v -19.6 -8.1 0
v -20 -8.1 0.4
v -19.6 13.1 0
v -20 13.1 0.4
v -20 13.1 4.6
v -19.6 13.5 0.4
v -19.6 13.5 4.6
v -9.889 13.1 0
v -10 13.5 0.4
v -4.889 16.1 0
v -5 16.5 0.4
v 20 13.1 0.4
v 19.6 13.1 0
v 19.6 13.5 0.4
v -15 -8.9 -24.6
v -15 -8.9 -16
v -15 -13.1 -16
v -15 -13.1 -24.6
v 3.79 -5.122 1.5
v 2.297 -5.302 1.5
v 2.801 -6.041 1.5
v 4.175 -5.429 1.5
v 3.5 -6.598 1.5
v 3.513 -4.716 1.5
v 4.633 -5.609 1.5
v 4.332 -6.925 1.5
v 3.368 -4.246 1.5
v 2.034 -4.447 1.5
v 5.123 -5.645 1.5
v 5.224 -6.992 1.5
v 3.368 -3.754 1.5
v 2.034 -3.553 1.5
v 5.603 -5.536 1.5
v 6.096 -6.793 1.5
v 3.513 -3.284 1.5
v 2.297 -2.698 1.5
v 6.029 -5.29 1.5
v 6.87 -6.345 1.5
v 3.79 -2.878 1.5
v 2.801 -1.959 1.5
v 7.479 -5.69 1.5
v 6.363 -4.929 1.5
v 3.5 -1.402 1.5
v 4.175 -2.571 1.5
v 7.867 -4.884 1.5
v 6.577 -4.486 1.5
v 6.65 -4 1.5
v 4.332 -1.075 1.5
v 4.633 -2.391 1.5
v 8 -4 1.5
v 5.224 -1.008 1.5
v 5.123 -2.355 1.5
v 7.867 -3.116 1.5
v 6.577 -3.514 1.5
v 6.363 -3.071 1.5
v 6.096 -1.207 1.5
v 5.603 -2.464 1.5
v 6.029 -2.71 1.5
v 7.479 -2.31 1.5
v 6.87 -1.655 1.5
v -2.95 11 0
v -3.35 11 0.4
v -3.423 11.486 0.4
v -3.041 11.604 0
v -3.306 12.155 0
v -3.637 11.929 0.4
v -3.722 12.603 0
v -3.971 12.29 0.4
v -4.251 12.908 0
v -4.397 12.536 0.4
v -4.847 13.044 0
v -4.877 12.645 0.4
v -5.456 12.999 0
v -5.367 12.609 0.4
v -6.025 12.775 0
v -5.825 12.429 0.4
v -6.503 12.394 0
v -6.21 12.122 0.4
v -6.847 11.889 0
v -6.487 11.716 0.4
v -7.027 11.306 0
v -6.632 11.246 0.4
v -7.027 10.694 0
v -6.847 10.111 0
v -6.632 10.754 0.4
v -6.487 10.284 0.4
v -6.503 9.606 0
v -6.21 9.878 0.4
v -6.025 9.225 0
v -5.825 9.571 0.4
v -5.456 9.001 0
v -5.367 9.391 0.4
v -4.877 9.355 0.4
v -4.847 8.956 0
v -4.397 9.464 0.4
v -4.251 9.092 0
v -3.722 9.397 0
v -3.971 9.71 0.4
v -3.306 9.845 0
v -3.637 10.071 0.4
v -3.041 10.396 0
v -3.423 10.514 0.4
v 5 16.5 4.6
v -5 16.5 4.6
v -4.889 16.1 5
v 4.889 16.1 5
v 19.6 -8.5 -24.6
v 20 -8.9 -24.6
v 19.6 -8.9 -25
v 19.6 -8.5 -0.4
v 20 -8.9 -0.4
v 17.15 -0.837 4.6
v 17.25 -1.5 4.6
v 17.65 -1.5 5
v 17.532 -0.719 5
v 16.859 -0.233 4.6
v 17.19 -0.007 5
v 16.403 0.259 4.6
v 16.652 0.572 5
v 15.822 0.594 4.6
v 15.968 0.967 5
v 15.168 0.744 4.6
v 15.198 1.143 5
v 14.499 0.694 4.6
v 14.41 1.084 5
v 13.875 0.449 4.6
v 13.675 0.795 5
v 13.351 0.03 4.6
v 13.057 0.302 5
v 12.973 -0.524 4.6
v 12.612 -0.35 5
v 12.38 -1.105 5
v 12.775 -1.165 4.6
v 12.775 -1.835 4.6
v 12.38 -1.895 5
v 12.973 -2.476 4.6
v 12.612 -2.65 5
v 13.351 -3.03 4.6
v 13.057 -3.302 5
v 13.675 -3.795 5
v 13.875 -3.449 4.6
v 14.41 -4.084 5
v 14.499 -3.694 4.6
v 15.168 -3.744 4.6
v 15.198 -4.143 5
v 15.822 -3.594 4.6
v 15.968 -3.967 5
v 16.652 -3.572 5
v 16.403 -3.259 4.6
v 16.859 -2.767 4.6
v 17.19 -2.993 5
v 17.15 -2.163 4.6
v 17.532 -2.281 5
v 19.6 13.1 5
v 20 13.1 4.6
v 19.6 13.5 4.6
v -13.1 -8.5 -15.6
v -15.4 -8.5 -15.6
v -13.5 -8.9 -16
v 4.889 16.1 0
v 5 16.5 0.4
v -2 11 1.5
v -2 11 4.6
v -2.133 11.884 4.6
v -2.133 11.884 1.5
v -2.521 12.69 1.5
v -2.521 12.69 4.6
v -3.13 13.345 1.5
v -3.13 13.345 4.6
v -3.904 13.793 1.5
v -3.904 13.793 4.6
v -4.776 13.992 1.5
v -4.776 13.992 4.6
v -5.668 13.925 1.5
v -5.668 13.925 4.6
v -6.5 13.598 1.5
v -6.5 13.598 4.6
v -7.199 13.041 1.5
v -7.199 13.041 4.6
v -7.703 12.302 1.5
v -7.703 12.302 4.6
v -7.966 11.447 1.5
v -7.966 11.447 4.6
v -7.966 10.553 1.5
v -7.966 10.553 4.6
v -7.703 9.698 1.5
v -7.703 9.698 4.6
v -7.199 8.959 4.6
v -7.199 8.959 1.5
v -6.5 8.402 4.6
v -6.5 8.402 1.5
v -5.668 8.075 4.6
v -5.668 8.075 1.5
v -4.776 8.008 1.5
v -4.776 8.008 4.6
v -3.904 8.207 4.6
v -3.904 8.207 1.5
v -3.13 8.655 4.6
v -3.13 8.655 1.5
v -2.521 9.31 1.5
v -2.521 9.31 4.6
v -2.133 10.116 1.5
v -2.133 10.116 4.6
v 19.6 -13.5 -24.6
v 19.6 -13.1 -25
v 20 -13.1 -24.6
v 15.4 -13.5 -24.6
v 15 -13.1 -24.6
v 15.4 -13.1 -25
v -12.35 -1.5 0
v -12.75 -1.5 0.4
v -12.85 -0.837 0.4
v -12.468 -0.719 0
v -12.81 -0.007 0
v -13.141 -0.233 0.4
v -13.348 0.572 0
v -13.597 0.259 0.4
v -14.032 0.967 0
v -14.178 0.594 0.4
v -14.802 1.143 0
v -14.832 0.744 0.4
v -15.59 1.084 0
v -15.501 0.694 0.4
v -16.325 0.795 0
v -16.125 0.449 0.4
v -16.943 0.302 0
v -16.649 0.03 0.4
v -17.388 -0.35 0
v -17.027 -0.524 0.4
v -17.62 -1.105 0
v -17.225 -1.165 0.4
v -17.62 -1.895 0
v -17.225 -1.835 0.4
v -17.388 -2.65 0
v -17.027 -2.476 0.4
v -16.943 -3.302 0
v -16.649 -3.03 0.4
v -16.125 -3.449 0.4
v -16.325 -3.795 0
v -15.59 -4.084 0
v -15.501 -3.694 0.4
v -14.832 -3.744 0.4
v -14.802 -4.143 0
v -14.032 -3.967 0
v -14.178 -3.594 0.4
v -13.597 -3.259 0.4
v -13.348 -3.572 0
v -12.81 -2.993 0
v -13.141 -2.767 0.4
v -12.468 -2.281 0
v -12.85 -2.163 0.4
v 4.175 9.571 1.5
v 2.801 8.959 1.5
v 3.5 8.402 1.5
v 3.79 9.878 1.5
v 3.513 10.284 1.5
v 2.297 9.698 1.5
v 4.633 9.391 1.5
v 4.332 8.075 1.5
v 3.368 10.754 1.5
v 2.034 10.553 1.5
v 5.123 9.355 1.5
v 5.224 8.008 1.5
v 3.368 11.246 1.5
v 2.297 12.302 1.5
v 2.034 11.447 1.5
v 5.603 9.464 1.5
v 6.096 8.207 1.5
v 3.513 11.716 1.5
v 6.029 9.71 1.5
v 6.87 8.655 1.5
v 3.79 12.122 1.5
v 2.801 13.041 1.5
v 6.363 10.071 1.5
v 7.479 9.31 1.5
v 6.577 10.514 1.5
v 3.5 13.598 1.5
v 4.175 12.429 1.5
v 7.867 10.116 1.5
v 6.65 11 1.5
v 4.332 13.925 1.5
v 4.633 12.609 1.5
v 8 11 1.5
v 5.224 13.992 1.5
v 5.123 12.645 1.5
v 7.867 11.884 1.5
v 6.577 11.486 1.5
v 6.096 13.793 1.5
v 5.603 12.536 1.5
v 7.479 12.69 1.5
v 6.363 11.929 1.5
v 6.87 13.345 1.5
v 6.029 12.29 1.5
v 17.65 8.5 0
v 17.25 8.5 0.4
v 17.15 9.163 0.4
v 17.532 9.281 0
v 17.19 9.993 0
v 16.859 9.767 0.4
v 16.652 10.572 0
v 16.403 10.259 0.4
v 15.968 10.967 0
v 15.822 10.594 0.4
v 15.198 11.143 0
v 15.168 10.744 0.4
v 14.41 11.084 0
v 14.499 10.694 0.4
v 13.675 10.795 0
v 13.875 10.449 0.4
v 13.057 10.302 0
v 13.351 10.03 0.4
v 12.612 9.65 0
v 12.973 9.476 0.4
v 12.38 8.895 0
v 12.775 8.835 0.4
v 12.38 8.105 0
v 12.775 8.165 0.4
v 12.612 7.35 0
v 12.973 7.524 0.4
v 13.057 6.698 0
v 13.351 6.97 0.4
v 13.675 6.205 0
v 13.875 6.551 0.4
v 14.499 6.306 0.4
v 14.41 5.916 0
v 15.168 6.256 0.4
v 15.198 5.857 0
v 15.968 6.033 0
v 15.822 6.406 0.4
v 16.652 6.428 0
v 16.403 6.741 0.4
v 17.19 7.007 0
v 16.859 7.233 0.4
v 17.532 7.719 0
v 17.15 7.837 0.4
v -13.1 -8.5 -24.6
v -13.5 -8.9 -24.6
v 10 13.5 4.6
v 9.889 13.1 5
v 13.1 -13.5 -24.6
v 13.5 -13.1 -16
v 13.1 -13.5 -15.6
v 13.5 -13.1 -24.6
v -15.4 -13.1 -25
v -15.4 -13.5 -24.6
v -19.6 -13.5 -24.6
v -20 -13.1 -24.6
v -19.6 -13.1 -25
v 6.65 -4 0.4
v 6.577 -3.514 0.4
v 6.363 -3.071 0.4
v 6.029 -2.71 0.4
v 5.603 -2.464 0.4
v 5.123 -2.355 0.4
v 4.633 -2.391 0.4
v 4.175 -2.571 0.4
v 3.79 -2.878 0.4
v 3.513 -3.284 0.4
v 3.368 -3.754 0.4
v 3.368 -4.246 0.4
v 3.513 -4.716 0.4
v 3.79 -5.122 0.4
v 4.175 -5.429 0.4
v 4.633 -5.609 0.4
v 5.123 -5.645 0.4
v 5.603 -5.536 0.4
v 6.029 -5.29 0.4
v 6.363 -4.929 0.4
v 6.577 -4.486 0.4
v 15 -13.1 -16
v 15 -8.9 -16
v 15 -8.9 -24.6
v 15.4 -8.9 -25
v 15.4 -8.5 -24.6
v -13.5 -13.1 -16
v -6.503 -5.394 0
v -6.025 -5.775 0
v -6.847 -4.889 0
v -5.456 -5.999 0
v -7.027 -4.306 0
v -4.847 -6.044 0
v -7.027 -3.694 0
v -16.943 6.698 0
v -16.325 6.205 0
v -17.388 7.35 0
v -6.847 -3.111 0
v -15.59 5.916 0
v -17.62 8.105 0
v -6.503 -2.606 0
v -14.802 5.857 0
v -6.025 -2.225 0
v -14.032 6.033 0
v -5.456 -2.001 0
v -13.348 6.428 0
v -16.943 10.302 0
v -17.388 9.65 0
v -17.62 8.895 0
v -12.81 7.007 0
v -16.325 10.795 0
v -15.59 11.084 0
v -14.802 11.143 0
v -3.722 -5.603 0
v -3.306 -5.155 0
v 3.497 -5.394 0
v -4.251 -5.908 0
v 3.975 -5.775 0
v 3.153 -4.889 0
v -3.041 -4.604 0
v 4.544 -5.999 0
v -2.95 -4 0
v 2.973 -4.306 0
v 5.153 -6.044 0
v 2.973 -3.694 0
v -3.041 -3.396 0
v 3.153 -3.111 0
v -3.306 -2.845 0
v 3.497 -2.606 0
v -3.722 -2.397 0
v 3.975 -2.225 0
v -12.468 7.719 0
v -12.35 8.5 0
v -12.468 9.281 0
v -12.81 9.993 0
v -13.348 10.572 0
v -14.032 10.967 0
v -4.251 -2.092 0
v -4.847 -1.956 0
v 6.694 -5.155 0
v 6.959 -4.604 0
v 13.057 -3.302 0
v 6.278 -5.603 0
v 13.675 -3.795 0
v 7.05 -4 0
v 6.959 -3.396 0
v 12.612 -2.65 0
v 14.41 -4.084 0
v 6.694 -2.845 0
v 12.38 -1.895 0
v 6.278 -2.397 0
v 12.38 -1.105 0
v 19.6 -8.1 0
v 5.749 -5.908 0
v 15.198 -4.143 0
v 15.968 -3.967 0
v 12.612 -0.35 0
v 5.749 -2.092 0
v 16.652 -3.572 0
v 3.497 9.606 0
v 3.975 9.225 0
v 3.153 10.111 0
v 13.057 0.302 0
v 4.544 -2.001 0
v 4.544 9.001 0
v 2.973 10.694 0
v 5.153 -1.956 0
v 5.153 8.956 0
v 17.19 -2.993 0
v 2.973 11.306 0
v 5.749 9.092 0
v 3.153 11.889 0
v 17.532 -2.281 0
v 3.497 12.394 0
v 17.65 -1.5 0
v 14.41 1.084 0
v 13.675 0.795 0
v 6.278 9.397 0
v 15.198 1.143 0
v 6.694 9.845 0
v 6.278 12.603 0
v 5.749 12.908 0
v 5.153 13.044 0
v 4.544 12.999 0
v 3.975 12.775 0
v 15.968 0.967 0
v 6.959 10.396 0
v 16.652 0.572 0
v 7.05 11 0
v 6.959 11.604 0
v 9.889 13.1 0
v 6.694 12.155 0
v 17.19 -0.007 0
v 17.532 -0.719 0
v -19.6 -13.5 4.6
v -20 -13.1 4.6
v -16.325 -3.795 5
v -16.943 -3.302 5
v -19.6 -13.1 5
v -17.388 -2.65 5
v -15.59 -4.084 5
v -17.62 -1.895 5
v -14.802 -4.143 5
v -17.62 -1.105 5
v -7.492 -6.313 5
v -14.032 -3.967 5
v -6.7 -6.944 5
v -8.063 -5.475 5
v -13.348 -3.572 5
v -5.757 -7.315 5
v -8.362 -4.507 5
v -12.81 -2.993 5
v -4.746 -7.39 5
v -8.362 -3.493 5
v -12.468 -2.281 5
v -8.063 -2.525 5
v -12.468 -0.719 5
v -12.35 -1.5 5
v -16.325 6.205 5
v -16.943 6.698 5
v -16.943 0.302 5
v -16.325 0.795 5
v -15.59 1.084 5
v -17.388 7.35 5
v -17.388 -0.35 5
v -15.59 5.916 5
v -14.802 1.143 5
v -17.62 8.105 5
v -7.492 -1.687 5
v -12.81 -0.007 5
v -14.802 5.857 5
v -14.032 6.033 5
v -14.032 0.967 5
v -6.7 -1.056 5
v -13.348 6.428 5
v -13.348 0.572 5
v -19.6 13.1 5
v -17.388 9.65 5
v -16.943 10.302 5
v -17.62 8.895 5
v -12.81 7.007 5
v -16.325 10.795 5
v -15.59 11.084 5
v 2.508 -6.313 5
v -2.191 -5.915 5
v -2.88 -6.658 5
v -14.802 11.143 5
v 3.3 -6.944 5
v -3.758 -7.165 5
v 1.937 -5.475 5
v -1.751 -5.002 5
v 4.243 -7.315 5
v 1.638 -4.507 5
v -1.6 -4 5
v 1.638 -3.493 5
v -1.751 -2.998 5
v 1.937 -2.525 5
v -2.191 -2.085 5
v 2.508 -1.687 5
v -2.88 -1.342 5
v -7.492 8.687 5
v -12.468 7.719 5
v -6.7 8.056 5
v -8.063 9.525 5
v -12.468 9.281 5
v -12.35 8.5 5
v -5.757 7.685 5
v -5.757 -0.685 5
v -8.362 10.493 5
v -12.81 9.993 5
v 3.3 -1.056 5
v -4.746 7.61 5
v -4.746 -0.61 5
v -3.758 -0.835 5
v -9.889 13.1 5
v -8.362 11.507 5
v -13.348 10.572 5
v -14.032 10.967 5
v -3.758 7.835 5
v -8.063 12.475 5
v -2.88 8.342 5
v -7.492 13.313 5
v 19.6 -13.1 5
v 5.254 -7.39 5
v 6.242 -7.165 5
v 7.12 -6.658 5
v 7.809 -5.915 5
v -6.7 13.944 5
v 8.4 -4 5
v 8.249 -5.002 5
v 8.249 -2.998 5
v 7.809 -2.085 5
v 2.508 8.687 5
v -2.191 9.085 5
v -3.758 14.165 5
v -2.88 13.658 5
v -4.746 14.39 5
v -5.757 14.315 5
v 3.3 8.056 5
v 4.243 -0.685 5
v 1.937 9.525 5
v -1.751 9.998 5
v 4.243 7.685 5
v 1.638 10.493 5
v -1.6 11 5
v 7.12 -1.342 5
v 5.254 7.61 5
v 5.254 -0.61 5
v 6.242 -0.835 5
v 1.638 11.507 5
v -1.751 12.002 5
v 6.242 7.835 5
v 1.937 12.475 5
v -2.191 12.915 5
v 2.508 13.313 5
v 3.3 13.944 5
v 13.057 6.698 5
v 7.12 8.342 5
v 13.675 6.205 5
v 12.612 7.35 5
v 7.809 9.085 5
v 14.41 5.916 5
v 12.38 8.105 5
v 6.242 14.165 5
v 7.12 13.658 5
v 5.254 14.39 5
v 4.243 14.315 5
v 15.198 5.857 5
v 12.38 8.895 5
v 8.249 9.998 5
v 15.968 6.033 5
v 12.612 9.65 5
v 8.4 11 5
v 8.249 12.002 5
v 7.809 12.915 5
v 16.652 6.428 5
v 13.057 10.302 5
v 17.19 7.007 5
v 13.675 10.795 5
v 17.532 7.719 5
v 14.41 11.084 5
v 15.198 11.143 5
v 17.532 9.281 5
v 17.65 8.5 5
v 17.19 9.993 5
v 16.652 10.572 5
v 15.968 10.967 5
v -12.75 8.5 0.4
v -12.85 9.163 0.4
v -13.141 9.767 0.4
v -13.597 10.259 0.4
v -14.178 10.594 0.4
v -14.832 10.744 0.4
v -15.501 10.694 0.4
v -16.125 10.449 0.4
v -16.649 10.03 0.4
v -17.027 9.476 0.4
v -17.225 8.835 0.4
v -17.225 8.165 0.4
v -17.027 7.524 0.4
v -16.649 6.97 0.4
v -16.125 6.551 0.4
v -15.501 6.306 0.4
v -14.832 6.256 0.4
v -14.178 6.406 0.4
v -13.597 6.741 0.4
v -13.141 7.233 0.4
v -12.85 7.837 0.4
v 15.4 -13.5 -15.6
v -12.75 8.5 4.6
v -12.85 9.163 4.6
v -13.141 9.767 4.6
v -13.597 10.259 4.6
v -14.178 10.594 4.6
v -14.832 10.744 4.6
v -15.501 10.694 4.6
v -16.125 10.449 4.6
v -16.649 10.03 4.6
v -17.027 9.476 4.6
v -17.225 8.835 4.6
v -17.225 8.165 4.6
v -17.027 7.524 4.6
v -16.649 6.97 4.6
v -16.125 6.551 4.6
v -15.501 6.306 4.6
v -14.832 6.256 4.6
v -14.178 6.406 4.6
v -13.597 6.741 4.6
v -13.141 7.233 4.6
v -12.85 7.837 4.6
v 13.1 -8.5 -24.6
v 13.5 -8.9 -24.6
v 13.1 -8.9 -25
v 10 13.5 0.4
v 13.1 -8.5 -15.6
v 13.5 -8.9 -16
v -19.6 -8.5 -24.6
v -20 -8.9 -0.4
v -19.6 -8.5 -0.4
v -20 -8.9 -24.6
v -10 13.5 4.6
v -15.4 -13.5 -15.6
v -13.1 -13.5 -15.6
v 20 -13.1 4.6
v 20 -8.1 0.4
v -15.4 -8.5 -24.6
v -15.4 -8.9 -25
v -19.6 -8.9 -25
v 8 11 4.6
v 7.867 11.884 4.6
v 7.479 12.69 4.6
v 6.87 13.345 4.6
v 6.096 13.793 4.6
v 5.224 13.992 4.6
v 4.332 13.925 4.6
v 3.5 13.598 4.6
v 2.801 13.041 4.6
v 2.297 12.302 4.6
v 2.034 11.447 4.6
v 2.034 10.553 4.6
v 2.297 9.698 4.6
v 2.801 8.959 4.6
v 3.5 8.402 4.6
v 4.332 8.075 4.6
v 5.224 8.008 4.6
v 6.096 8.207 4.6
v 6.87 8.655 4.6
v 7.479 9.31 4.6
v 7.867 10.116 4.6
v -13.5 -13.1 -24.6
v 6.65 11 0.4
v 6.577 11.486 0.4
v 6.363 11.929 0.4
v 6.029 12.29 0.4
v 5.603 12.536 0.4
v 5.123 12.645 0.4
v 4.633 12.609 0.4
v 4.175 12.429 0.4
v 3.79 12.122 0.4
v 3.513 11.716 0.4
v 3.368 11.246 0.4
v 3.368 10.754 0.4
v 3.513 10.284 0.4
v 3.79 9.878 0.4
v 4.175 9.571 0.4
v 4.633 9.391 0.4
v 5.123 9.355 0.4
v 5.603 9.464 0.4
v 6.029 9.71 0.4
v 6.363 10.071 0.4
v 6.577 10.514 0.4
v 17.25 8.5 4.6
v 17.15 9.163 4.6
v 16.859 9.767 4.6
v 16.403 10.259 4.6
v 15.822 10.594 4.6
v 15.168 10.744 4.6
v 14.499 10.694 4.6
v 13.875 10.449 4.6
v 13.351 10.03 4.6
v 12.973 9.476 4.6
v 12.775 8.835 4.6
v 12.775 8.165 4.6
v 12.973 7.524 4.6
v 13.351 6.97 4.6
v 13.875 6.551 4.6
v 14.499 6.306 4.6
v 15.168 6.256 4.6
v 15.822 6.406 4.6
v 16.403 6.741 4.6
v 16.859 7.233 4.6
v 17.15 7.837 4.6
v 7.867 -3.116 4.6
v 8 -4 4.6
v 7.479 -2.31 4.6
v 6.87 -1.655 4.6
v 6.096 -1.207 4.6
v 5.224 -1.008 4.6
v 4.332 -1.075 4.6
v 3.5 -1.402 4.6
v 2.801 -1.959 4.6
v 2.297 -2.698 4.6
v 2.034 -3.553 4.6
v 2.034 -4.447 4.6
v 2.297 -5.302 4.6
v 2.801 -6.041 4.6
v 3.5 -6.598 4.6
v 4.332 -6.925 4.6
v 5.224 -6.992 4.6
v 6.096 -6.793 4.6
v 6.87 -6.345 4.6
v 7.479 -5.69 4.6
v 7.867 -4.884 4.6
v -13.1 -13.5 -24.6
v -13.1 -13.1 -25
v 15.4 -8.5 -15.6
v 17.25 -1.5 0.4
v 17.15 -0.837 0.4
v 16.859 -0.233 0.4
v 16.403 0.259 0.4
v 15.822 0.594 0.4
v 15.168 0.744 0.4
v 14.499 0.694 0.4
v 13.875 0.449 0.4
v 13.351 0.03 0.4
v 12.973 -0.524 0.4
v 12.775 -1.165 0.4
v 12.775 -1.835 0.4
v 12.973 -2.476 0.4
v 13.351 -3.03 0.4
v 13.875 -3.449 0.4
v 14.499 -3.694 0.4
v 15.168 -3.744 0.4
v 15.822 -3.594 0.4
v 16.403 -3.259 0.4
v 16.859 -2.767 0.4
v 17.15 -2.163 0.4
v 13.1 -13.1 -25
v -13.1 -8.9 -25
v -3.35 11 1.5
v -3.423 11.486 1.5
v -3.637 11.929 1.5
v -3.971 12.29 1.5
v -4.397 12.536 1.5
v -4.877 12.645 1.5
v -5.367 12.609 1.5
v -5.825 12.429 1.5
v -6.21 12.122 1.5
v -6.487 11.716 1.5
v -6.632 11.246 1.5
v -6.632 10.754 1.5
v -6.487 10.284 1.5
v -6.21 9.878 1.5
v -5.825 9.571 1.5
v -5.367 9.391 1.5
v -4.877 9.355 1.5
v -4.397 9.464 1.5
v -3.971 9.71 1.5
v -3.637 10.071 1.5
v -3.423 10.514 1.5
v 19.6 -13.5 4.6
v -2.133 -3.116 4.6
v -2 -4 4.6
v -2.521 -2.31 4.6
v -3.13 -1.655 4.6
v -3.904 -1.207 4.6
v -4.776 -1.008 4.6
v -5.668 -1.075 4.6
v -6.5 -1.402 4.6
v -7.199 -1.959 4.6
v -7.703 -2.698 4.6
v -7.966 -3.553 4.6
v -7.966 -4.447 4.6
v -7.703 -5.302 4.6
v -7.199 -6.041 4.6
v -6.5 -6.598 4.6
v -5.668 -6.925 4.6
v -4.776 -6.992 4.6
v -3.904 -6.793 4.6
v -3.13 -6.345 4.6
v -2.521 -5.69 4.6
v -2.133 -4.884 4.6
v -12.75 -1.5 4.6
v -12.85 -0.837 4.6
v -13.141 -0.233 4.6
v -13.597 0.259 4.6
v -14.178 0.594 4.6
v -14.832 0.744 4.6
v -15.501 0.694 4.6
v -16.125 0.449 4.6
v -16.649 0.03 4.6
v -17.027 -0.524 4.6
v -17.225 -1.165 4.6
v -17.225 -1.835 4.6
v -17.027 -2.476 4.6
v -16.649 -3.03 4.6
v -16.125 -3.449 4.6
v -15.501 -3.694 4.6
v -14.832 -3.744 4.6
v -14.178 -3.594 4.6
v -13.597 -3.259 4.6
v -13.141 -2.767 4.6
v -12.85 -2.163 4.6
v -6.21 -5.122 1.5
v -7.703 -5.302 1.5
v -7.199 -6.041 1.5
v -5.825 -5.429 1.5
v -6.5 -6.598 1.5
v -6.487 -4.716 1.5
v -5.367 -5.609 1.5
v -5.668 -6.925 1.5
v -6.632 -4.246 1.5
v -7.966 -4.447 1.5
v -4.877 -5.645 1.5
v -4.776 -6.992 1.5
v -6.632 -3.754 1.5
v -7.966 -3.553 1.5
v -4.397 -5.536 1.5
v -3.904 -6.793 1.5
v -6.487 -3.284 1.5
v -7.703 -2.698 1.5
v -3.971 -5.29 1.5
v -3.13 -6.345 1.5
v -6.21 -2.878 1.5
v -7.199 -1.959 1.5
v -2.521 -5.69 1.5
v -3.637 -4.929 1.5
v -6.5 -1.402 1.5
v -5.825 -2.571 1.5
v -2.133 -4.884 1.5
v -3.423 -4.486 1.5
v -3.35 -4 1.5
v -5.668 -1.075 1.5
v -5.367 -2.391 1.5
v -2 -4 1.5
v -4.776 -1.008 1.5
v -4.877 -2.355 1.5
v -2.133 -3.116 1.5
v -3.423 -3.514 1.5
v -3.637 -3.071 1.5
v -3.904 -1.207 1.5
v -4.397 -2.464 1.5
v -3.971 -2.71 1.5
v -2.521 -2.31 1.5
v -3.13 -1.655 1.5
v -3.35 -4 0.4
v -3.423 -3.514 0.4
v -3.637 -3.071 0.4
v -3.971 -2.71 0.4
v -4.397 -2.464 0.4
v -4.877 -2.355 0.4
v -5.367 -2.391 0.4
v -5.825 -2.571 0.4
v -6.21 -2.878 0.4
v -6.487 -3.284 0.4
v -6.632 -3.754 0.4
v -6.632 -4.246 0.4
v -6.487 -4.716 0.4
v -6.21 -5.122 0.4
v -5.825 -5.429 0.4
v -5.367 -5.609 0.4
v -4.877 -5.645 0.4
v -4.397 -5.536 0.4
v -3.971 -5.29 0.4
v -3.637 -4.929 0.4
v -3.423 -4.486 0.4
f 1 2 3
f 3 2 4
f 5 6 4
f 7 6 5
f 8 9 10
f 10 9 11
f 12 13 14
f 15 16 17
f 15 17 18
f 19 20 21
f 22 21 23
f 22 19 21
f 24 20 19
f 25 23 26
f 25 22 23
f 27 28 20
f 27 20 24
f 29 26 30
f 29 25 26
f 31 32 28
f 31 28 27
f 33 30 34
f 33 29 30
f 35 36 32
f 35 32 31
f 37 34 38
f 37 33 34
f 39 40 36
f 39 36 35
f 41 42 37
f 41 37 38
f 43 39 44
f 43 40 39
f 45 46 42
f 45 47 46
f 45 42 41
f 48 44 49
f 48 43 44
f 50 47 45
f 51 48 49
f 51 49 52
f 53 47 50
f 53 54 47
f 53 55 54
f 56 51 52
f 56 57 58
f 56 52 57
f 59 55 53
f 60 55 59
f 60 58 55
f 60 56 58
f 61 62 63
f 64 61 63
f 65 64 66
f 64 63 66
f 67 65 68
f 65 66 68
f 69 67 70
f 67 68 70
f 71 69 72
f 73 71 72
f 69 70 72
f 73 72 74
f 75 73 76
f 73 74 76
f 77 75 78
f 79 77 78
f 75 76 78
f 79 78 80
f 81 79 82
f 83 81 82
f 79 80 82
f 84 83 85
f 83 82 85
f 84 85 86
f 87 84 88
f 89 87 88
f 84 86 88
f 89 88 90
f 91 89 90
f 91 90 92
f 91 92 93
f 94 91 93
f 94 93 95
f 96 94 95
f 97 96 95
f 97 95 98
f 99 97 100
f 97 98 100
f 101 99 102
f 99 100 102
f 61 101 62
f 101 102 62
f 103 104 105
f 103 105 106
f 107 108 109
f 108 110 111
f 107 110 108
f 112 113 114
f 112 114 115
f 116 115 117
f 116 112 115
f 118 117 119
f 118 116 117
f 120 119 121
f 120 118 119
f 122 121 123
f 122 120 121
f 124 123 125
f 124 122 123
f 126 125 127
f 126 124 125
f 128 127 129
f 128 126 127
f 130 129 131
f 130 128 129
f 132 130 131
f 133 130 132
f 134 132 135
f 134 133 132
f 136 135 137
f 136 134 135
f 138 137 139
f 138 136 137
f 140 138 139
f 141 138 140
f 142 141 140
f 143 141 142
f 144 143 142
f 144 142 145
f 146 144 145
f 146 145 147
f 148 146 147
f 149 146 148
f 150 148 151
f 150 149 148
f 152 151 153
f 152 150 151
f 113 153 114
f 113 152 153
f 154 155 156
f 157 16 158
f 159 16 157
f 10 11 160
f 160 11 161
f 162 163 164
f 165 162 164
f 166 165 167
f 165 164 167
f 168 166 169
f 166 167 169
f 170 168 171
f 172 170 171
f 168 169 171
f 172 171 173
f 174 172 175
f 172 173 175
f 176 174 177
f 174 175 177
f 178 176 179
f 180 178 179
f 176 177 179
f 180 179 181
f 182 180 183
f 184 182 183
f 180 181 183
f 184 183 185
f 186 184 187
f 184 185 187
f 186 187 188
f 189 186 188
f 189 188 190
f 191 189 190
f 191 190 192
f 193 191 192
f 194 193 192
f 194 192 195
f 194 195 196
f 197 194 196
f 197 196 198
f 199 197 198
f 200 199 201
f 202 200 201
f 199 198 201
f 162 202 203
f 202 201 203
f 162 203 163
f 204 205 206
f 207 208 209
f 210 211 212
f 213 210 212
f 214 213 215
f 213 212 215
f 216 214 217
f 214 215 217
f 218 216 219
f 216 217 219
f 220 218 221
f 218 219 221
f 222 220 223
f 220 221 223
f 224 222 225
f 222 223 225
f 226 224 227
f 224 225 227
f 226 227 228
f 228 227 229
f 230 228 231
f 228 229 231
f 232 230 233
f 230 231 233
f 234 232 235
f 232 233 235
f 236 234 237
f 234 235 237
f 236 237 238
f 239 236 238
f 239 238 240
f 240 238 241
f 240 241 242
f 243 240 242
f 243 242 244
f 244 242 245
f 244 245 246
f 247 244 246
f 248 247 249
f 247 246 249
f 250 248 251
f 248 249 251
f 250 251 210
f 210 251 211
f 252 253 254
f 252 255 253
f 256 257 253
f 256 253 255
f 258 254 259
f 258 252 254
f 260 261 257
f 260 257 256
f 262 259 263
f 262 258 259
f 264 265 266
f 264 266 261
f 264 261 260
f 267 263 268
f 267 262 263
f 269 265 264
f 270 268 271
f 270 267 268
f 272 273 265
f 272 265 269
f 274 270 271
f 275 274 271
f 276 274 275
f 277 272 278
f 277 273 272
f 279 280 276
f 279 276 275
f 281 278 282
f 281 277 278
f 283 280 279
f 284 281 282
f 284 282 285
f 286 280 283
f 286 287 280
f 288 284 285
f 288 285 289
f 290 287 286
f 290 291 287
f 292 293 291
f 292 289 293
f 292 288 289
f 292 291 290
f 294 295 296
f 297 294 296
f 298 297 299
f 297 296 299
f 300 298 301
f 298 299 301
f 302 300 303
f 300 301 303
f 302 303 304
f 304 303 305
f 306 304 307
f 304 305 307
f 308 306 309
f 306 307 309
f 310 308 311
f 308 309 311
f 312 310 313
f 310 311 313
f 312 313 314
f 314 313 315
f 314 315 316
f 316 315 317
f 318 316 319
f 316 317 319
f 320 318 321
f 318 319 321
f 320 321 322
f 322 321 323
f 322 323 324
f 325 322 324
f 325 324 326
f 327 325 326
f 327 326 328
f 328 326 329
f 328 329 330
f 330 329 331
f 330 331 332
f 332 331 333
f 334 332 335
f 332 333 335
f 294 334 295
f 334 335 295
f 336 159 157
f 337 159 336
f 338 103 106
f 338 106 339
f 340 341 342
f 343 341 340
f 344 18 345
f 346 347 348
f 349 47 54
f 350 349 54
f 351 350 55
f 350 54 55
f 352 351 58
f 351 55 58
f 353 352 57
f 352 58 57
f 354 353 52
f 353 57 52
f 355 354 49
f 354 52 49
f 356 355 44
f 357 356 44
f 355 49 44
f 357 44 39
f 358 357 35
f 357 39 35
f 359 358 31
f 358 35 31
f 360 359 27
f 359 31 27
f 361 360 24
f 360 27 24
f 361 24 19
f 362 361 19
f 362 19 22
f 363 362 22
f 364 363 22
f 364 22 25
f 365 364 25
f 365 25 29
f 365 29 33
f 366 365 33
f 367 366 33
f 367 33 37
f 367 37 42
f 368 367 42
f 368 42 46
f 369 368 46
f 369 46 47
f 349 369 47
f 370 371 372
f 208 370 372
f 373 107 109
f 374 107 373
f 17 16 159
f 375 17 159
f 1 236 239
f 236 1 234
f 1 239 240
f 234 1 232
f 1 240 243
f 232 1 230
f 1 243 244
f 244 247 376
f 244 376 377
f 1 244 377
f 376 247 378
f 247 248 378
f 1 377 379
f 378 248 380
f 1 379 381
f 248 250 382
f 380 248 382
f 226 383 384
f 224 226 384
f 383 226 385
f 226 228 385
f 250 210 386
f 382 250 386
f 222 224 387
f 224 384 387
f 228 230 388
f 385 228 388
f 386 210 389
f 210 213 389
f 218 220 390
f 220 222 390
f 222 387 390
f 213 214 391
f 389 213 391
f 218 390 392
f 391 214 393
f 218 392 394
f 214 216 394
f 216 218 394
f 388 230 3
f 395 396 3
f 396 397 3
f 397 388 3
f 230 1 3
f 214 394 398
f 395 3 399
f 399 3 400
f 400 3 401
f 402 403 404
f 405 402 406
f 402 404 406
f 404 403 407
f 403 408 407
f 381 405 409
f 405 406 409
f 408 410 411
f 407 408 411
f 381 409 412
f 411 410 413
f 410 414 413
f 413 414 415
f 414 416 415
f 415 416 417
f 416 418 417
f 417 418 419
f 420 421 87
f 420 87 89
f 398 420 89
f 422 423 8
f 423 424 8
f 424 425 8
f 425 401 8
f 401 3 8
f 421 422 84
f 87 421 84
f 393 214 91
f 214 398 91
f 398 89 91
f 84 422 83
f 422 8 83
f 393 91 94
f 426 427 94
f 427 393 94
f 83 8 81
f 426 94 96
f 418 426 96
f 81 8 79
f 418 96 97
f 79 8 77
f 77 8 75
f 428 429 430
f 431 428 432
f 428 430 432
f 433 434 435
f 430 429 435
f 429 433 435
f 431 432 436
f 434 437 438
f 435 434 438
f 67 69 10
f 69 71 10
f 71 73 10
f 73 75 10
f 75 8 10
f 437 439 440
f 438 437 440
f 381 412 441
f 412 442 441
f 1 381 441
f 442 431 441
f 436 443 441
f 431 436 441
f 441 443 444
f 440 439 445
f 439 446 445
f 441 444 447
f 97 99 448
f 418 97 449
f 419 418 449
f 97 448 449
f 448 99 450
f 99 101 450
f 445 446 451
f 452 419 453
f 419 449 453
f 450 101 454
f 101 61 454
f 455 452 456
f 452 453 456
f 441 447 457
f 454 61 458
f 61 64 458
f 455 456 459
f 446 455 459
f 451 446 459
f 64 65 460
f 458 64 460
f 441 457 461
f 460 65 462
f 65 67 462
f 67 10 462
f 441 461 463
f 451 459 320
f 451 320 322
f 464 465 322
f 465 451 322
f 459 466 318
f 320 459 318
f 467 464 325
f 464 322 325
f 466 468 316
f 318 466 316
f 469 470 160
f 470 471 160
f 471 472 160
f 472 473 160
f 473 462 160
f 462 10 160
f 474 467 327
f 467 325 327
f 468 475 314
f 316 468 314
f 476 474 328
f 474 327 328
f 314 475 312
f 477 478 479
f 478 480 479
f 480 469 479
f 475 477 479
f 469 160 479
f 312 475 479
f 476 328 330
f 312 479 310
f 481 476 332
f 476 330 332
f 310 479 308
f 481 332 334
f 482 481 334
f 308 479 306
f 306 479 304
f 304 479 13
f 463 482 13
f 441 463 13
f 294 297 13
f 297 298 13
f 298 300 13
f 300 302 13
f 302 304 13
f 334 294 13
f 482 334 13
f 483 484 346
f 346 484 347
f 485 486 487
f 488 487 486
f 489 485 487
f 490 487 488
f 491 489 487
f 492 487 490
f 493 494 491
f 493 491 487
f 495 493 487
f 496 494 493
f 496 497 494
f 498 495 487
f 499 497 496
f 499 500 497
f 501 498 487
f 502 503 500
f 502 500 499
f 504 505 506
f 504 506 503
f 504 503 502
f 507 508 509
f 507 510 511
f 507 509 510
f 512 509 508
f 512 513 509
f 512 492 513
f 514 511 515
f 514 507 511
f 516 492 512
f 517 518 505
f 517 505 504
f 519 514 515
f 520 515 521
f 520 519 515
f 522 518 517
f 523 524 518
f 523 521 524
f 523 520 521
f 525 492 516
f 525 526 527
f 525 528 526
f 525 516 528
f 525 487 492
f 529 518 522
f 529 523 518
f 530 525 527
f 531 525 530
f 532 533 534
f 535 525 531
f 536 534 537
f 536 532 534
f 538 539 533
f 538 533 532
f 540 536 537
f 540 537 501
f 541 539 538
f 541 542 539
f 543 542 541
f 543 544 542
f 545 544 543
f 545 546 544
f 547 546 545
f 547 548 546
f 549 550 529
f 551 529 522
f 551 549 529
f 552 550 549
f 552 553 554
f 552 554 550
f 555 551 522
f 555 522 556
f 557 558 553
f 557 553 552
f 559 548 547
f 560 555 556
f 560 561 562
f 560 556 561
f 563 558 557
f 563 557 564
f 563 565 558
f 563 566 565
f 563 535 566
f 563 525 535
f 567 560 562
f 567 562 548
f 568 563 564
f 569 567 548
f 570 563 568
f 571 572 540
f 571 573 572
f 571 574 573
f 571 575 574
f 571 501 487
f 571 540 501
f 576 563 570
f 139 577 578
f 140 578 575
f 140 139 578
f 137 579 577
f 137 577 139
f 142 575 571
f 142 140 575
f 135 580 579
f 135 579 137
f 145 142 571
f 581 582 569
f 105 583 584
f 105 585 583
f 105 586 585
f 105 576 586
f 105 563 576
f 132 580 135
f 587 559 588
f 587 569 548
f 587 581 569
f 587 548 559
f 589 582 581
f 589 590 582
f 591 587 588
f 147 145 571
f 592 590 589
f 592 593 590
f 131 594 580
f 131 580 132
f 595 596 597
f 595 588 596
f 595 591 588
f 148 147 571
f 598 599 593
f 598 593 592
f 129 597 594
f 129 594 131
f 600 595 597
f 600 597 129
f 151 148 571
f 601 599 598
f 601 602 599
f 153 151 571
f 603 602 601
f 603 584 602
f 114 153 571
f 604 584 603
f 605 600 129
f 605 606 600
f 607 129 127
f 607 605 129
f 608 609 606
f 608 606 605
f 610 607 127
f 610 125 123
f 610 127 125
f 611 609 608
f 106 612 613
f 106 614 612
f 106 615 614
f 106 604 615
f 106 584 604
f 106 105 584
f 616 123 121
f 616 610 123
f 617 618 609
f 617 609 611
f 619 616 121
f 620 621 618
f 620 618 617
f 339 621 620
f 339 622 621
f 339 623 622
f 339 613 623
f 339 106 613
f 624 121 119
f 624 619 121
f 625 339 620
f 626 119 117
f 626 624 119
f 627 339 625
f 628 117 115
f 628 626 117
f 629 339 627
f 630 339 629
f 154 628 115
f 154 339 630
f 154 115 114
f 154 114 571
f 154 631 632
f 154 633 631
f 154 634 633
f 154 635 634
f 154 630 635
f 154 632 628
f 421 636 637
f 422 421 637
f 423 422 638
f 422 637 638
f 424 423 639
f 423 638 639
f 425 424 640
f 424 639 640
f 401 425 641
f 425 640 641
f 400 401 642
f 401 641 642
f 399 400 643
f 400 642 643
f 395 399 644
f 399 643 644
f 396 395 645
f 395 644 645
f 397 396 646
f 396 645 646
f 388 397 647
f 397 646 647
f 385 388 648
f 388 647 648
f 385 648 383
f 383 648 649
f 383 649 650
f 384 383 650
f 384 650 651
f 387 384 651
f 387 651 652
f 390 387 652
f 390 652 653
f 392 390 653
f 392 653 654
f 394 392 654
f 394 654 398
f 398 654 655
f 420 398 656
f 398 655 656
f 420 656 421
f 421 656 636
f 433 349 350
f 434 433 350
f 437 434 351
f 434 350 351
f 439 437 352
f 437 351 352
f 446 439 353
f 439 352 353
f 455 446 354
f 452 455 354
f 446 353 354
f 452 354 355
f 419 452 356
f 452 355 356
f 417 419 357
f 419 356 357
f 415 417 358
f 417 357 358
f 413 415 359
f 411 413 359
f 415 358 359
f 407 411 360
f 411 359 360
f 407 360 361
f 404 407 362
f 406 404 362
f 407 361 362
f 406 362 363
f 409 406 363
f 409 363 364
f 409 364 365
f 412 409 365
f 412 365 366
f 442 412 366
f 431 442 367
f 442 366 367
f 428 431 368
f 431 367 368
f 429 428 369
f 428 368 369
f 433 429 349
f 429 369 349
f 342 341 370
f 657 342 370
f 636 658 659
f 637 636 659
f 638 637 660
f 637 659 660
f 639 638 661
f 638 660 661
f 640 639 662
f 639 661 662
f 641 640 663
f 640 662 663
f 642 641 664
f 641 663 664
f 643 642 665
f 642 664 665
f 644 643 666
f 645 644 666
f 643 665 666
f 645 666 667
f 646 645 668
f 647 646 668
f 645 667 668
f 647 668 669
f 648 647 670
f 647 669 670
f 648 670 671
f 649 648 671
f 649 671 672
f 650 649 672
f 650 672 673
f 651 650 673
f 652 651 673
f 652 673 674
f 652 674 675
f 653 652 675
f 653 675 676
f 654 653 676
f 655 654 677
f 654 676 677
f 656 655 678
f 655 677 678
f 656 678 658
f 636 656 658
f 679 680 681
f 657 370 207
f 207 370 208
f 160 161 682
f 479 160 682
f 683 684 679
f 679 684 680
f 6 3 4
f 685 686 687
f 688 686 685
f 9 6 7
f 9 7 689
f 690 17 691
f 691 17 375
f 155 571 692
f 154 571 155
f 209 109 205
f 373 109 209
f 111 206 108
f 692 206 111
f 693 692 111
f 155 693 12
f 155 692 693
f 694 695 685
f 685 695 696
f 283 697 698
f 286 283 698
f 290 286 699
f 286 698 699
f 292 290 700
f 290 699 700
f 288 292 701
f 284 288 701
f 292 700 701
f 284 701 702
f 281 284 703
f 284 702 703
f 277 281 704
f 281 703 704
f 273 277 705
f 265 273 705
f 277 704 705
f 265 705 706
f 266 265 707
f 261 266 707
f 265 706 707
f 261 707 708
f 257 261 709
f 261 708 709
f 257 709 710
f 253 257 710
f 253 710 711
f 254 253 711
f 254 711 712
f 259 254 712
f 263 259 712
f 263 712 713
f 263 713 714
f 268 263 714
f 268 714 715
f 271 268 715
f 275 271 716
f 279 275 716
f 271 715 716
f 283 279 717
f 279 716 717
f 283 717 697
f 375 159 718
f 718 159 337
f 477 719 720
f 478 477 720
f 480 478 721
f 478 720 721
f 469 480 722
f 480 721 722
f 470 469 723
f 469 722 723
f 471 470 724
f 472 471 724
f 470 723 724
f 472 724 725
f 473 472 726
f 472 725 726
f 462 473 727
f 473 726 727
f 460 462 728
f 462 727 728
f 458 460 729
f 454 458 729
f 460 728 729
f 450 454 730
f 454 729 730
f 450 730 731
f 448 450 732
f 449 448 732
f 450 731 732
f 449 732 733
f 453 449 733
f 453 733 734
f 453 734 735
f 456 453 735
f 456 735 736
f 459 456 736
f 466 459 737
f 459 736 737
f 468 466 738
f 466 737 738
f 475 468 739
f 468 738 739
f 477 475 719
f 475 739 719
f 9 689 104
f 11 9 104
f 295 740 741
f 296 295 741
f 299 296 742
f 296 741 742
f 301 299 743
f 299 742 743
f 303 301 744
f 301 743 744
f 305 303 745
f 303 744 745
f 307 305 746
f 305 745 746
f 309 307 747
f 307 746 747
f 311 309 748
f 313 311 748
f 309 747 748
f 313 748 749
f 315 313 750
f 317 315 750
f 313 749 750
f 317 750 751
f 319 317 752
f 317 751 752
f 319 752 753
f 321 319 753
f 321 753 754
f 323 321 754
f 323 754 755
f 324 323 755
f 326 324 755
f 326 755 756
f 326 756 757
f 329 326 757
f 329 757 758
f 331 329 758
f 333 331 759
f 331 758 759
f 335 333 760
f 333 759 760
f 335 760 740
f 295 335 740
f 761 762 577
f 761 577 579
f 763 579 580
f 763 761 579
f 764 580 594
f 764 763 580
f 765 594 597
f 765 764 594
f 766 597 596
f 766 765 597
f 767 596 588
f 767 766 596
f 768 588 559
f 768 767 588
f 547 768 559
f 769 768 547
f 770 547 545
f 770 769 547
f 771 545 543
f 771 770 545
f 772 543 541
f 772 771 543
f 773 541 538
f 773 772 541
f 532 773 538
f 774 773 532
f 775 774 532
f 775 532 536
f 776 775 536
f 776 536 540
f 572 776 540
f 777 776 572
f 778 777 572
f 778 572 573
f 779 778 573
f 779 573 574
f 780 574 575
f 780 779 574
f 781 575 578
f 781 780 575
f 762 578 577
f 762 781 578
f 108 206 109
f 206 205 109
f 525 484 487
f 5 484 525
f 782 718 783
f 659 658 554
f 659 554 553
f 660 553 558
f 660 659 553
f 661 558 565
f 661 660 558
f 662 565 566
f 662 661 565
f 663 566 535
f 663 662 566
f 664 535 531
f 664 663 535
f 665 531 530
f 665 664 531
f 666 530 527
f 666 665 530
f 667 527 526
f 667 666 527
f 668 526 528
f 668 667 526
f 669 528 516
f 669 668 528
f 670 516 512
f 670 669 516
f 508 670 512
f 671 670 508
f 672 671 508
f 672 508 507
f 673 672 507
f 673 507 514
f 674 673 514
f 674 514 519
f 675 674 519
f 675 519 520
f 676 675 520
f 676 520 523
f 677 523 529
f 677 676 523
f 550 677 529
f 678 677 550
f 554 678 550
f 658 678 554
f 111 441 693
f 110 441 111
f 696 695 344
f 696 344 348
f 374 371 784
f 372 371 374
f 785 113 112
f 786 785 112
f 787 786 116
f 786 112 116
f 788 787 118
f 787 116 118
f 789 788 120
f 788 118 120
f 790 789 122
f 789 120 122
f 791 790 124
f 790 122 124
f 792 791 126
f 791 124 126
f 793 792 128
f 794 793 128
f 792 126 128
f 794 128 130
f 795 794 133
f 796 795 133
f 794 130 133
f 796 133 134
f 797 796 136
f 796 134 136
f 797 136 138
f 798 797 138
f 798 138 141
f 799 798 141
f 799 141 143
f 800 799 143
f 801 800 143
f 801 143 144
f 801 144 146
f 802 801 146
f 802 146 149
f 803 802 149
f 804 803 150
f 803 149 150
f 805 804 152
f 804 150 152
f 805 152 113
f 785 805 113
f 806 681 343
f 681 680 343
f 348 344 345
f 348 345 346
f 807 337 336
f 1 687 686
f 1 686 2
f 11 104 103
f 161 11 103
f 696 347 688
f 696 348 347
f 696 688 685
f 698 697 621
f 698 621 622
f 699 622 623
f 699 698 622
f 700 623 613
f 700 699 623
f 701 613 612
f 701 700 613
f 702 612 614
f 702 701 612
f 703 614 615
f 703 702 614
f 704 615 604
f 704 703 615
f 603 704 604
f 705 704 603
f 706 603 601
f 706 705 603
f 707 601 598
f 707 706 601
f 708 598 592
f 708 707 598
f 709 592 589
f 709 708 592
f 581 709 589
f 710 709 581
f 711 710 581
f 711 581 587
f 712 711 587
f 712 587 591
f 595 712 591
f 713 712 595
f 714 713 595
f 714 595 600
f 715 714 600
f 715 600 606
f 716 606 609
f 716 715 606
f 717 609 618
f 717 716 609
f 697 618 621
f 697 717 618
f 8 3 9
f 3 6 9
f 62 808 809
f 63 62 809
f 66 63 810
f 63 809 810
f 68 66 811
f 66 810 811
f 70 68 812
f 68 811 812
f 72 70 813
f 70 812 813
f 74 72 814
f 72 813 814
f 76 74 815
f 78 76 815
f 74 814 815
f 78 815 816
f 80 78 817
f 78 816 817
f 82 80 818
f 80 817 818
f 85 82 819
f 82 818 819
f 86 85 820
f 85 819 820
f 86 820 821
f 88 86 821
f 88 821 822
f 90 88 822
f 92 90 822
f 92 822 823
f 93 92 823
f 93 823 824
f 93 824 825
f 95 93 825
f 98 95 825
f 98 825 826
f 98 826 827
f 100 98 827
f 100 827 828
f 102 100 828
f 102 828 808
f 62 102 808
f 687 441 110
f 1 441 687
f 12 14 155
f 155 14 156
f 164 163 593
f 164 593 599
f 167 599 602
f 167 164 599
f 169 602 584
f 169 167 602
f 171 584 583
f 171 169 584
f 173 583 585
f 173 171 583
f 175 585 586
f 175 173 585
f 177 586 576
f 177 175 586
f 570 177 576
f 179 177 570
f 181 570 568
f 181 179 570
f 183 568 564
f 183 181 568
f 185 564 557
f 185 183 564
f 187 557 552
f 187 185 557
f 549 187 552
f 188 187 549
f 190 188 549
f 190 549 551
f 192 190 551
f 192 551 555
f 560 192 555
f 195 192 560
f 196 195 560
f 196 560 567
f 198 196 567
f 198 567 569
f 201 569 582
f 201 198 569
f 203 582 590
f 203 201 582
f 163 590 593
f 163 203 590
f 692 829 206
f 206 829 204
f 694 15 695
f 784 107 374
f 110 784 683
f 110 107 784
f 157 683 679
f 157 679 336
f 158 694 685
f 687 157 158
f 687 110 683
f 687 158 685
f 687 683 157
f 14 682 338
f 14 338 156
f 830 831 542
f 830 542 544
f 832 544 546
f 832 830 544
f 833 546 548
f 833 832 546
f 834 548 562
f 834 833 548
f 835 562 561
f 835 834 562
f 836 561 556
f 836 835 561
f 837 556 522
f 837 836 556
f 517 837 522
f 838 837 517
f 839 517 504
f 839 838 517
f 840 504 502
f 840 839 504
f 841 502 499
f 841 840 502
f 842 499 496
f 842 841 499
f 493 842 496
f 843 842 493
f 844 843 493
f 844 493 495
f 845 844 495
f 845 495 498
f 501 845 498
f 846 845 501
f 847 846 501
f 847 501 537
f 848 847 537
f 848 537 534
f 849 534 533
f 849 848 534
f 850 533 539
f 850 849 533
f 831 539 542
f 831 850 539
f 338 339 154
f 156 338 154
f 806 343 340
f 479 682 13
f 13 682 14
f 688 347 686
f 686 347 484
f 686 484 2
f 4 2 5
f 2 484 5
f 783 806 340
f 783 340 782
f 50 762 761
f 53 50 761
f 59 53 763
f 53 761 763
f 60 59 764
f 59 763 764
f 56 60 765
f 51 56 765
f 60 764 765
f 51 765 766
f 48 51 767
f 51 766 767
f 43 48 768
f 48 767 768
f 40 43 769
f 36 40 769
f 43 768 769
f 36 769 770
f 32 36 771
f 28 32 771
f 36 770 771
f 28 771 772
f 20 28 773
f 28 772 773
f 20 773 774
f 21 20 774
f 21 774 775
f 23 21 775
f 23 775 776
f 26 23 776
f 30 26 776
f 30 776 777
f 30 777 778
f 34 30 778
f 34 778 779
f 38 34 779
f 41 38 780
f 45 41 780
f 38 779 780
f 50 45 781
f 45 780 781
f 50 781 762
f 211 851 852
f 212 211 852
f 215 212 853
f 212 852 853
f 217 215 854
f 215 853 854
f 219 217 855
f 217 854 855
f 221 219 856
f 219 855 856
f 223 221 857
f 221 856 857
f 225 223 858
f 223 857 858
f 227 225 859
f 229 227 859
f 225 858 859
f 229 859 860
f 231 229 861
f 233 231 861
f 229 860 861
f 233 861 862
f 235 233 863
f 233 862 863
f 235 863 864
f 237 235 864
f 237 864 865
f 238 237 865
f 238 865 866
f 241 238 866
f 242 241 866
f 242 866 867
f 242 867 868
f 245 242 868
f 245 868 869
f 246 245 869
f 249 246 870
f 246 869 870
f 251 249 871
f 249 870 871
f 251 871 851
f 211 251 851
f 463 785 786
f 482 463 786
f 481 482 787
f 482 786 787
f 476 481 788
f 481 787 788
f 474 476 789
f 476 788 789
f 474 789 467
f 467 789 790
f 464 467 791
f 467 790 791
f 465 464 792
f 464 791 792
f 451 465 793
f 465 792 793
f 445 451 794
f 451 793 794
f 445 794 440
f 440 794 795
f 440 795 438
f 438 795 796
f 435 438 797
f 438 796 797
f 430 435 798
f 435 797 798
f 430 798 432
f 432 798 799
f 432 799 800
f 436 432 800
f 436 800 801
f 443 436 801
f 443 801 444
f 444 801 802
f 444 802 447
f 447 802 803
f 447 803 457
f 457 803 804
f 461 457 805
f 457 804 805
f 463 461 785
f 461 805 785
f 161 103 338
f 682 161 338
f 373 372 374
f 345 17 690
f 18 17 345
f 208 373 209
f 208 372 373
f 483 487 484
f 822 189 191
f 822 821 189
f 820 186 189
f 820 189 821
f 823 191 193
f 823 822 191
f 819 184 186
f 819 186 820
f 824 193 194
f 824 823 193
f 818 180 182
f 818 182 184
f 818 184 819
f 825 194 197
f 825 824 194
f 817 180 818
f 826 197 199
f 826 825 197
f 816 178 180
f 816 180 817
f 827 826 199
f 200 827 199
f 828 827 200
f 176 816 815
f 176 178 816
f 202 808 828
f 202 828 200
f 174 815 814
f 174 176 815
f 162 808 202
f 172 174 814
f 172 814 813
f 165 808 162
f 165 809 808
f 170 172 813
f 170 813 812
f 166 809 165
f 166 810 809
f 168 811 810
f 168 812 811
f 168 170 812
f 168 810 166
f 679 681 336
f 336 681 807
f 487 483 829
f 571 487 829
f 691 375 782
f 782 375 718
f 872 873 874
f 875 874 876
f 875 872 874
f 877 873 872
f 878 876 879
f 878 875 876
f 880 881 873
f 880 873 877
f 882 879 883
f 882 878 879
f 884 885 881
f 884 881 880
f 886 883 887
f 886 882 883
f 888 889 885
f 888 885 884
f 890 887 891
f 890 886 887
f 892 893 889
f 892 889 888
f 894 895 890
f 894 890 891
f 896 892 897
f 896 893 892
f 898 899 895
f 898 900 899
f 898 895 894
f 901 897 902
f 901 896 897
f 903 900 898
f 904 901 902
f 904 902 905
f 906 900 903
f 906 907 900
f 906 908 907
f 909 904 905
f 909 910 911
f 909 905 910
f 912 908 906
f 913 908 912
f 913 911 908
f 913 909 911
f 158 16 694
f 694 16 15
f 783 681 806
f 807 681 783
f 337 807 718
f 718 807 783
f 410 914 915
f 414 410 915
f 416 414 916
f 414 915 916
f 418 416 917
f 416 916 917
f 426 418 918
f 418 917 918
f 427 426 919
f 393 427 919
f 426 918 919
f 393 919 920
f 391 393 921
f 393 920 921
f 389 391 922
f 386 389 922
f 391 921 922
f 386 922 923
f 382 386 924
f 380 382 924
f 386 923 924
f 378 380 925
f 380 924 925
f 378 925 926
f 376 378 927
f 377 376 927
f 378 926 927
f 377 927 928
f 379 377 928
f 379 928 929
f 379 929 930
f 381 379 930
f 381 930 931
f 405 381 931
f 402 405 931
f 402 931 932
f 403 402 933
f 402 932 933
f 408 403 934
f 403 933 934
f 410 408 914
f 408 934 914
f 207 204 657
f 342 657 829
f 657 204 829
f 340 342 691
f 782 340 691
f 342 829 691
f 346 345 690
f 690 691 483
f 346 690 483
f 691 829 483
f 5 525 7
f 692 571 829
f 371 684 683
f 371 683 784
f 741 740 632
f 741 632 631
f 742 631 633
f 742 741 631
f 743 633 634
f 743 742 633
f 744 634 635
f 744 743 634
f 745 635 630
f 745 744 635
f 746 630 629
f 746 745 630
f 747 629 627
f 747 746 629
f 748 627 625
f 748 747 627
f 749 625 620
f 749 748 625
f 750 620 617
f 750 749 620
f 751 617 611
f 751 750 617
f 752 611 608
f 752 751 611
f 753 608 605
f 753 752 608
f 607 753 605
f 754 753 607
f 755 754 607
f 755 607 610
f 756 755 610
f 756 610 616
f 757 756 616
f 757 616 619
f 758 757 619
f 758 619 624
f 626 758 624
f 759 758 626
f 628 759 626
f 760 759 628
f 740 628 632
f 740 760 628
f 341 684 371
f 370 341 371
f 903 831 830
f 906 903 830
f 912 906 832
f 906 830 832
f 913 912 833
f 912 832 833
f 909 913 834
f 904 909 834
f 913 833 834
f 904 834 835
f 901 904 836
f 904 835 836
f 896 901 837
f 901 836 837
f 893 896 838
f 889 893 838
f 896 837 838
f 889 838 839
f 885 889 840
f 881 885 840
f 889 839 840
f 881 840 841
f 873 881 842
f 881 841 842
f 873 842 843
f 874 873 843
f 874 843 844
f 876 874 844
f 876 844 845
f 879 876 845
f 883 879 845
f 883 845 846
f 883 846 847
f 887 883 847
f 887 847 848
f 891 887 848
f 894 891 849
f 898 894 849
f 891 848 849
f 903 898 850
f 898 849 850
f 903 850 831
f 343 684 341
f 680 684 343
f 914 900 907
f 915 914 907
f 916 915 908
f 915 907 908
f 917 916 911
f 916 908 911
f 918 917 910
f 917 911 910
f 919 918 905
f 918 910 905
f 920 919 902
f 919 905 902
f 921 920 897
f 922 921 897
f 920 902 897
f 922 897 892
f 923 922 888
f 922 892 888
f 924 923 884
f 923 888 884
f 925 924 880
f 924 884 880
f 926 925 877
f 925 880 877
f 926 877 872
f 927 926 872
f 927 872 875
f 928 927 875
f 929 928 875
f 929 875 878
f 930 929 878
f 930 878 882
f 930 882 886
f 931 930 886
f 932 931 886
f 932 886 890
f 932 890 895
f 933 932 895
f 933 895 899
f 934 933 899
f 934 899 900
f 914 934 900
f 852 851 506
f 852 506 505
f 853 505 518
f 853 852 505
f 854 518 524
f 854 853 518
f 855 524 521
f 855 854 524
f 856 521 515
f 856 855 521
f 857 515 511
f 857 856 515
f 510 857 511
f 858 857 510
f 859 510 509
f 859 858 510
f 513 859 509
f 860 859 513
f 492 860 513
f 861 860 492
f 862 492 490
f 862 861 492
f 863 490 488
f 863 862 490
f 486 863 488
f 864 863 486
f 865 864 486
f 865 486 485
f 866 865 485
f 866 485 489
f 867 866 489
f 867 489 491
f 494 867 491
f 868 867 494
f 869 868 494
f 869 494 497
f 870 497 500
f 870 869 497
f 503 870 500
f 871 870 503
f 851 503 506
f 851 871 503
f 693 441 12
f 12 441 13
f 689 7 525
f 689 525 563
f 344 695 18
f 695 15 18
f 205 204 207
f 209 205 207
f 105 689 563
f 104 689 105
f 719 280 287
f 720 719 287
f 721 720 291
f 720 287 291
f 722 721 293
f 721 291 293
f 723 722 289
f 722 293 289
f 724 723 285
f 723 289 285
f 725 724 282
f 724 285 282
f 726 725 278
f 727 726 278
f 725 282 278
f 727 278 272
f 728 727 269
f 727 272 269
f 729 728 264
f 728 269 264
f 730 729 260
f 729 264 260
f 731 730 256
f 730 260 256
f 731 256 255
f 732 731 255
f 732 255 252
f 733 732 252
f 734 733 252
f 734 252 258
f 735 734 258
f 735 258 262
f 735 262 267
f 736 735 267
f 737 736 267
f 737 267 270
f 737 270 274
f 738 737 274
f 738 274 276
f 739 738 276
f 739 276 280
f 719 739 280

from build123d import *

# Parameters (mm, degrees)
SKETCH1_W           = 40
SKETCH1_H           = 27
BOSS_EXTRUDE1_DEPTH = 5
SKETCH2_W           = 40
SKETCH2_H           = 5
BOSS_EXTRUDE2_DEPTH = 25
SKETCH3_R           = 1.65
CUT_EXTRUDE1_DEPTH  = 15
BOSS_EXTRUDE3_DEPTH = 5
SKETCH5_R           = 3
CUT_EXTRUDE2_DEPTH  = 3.5
SKETCH6_W           = 1.5
SKETCH6_H           = 9
CUT_EXTRUDE3_DEPTH  = 5
SKETCH7_R           = 2.25
CUT_EXTRUDE4_DEPTH  = 5
CHAMFER1_SIZE       = 0.4


with BuildPart() as part:
    # Sketch1 → Boss-Extrude1 (new body)
    with BuildSketch(Plane.XY):
        Rectangle(SKETCH1_W, SKETCH1_H)
    extrude(amount=BOSS_EXTRUDE1_DEPTH)

    # Sketch2 → Boss-Extrude2 (add)
    with BuildSketch(Plane(origin=(0, 0, 0), x_dir=(-1, 0, 0), z_dir=(0, 0, -1))):
        with Locations((0, -11)):
            Rectangle(SKETCH2_W, SKETCH2_H)
    extrude(amount=BOSS_EXTRUDE2_DEPTH)

    # Sketch3 → Cut-Extrude1 (cut)
    with BuildSketch(Plane.XY.offset(5)):
        with Locations((-5, 11)):
            Circle(SKETCH3_R)
        with Locations((5, 11)):
            Circle(SKETCH3_R)
        with Locations((5, -4)):
            Circle(SKETCH3_R)
        with Locations((-5, -4)):
            Circle(SKETCH3_R)
    extrude(amount=-CUT_EXTRUDE1_DEPTH, mode=Mode.SUBTRACT)

    # Sketch4 → Boss-Extrude3 (add)
    with BuildSketch(Plane.XY.offset(5)):
        Polygon((-10, 13.5), (-5, 16.5), (5, 16.5), (10, 13.5), align=None)
    extrude(amount=-BOSS_EXTRUDE3_DEPTH)

    # Sketch5 → Cut-Extrude2 (cut)
    with BuildSketch(Plane.XY.offset(5)):
        with Locations((-5, 11)):
            Circle(SKETCH5_R)
        with Locations((5, 11)):
            Circle(SKETCH5_R)
        with Locations((5, -4)):
            Circle(SKETCH5_R)
        with Locations((-5, -4)):
            Circle(SKETCH5_R)
    extrude(amount=-CUT_EXTRUDE2_DEPTH, mode=Mode.SUBTRACT)

    # Sketch6 → Cut-Extrude3 (cut)
    with BuildSketch(Plane(origin=(0, -8.5, 0), x_dir=(1, 0, 0), z_dir=(0, 1, 0))):
        with Locations((-14.25, 20.5)):
            Rectangle(SKETCH6_W, SKETCH6_H)
        with Locations((14.25, 20.5)):
            Rectangle(SKETCH6_W, SKETCH6_H)
    extrude(amount=-CUT_EXTRUDE3_DEPTH, mode=Mode.SUBTRACT)

    # Sketch7 → Cut-Extrude4 (cut)
    with BuildSketch(Plane.XY.offset(5)):
        with Locations((-15, 8.5)):
            Circle(SKETCH7_R)
        with Locations((15, 8.5)):
            Circle(SKETCH7_R)
        with Locations((15, -1.5)):
            Circle(SKETCH7_R)
        with Locations((-15, -1.5)):
            Circle(SKETCH7_R)
    extrude(amount=-CUT_EXTRUDE4_DEPTH, mode=Mode.SUBTRACT)

    # Chamfer1
    chamfer1_edges = [part.edges().sort_by_distance(p)[0] for p in [
        (-15, -13.5, -20.5),
        (-15, -11, -25),
        (-13.5, -13.5, -20.5),
        (-13.5, -11, -25),
        (-14.25, -13.5, -16),
        (-15, -8.5, -20.5),
        (-14.25, -8.5, -16),
        (-13.5, -8.5, -20.5),
        (13.5, -13.5, -20.5),
        (13.5, -11, -25),
        (15, -13.5, -20.5),
        (15, -11, -25),
        (14.25, -13.5, -16),
        (13.5, -8.5, -20.5),
        (14.25, -8.5, -16),
        (15, -8.5, -20.5),
        (-17.25, -1.5, 0),
        (-17.25, -1.5, 5),
        (-20, 0, 5),
        (12.75, -1.5, 0),
        (12.75, -1.5, 5),
        (12.75, 8.5, 0),
        (12.75, 8.5, 5),
        (-17.25, 8.5, 0),
        (-17.25, 8.5, 5),
        (20, 2.5, 0),
        (20, -8.5, -12.5),
        (0, -8.5, 0),
        (0, -13.5, 5),
        (-20, -8.5, -12.5),
        (20, -11, -25),
        (17.5, -13.5, -25),
        (-20, -11, -25),
        (-17.5, -8.5, -25),
        (-6.65, -4, 0),
        (3.35, -4, 0),
        (3.35, 11, 0),
        (-6.65, 11, 0),
        (-15, 13.5, 0),
        (-15, 13.5, 5),
        (20, 0, 5),
        (-7.5, 15, 0),
        (0, 16.5, 0),
        (7.5, 15, 0),
        (7.5, 15, 5),
        (0, 16.5, 5),
        (-7.5, 15, 5),
        (-20, 2.5, 0),
        (15, 13.5, 0),
        (-8, -4, 5),
        (2, -4, 5),
        (2, 11, 5),
        (-8, 11, 5),
        (20, -13.5, -10),
        (-20, -13.5, -10),
        (-20, 13.5, 2.5),
        (20, 13.5, 2.5),
        (0, -13.5, -25),
        (15, 13.5, 5),
        (-17.5, -13.5, -25),
        (0, -8.5, -25),
        (17.5, -8.5, -25),
    ]]
    chamfer(chamfer1_edges, length=CHAMFER1_SIZE)


solid = part.part
